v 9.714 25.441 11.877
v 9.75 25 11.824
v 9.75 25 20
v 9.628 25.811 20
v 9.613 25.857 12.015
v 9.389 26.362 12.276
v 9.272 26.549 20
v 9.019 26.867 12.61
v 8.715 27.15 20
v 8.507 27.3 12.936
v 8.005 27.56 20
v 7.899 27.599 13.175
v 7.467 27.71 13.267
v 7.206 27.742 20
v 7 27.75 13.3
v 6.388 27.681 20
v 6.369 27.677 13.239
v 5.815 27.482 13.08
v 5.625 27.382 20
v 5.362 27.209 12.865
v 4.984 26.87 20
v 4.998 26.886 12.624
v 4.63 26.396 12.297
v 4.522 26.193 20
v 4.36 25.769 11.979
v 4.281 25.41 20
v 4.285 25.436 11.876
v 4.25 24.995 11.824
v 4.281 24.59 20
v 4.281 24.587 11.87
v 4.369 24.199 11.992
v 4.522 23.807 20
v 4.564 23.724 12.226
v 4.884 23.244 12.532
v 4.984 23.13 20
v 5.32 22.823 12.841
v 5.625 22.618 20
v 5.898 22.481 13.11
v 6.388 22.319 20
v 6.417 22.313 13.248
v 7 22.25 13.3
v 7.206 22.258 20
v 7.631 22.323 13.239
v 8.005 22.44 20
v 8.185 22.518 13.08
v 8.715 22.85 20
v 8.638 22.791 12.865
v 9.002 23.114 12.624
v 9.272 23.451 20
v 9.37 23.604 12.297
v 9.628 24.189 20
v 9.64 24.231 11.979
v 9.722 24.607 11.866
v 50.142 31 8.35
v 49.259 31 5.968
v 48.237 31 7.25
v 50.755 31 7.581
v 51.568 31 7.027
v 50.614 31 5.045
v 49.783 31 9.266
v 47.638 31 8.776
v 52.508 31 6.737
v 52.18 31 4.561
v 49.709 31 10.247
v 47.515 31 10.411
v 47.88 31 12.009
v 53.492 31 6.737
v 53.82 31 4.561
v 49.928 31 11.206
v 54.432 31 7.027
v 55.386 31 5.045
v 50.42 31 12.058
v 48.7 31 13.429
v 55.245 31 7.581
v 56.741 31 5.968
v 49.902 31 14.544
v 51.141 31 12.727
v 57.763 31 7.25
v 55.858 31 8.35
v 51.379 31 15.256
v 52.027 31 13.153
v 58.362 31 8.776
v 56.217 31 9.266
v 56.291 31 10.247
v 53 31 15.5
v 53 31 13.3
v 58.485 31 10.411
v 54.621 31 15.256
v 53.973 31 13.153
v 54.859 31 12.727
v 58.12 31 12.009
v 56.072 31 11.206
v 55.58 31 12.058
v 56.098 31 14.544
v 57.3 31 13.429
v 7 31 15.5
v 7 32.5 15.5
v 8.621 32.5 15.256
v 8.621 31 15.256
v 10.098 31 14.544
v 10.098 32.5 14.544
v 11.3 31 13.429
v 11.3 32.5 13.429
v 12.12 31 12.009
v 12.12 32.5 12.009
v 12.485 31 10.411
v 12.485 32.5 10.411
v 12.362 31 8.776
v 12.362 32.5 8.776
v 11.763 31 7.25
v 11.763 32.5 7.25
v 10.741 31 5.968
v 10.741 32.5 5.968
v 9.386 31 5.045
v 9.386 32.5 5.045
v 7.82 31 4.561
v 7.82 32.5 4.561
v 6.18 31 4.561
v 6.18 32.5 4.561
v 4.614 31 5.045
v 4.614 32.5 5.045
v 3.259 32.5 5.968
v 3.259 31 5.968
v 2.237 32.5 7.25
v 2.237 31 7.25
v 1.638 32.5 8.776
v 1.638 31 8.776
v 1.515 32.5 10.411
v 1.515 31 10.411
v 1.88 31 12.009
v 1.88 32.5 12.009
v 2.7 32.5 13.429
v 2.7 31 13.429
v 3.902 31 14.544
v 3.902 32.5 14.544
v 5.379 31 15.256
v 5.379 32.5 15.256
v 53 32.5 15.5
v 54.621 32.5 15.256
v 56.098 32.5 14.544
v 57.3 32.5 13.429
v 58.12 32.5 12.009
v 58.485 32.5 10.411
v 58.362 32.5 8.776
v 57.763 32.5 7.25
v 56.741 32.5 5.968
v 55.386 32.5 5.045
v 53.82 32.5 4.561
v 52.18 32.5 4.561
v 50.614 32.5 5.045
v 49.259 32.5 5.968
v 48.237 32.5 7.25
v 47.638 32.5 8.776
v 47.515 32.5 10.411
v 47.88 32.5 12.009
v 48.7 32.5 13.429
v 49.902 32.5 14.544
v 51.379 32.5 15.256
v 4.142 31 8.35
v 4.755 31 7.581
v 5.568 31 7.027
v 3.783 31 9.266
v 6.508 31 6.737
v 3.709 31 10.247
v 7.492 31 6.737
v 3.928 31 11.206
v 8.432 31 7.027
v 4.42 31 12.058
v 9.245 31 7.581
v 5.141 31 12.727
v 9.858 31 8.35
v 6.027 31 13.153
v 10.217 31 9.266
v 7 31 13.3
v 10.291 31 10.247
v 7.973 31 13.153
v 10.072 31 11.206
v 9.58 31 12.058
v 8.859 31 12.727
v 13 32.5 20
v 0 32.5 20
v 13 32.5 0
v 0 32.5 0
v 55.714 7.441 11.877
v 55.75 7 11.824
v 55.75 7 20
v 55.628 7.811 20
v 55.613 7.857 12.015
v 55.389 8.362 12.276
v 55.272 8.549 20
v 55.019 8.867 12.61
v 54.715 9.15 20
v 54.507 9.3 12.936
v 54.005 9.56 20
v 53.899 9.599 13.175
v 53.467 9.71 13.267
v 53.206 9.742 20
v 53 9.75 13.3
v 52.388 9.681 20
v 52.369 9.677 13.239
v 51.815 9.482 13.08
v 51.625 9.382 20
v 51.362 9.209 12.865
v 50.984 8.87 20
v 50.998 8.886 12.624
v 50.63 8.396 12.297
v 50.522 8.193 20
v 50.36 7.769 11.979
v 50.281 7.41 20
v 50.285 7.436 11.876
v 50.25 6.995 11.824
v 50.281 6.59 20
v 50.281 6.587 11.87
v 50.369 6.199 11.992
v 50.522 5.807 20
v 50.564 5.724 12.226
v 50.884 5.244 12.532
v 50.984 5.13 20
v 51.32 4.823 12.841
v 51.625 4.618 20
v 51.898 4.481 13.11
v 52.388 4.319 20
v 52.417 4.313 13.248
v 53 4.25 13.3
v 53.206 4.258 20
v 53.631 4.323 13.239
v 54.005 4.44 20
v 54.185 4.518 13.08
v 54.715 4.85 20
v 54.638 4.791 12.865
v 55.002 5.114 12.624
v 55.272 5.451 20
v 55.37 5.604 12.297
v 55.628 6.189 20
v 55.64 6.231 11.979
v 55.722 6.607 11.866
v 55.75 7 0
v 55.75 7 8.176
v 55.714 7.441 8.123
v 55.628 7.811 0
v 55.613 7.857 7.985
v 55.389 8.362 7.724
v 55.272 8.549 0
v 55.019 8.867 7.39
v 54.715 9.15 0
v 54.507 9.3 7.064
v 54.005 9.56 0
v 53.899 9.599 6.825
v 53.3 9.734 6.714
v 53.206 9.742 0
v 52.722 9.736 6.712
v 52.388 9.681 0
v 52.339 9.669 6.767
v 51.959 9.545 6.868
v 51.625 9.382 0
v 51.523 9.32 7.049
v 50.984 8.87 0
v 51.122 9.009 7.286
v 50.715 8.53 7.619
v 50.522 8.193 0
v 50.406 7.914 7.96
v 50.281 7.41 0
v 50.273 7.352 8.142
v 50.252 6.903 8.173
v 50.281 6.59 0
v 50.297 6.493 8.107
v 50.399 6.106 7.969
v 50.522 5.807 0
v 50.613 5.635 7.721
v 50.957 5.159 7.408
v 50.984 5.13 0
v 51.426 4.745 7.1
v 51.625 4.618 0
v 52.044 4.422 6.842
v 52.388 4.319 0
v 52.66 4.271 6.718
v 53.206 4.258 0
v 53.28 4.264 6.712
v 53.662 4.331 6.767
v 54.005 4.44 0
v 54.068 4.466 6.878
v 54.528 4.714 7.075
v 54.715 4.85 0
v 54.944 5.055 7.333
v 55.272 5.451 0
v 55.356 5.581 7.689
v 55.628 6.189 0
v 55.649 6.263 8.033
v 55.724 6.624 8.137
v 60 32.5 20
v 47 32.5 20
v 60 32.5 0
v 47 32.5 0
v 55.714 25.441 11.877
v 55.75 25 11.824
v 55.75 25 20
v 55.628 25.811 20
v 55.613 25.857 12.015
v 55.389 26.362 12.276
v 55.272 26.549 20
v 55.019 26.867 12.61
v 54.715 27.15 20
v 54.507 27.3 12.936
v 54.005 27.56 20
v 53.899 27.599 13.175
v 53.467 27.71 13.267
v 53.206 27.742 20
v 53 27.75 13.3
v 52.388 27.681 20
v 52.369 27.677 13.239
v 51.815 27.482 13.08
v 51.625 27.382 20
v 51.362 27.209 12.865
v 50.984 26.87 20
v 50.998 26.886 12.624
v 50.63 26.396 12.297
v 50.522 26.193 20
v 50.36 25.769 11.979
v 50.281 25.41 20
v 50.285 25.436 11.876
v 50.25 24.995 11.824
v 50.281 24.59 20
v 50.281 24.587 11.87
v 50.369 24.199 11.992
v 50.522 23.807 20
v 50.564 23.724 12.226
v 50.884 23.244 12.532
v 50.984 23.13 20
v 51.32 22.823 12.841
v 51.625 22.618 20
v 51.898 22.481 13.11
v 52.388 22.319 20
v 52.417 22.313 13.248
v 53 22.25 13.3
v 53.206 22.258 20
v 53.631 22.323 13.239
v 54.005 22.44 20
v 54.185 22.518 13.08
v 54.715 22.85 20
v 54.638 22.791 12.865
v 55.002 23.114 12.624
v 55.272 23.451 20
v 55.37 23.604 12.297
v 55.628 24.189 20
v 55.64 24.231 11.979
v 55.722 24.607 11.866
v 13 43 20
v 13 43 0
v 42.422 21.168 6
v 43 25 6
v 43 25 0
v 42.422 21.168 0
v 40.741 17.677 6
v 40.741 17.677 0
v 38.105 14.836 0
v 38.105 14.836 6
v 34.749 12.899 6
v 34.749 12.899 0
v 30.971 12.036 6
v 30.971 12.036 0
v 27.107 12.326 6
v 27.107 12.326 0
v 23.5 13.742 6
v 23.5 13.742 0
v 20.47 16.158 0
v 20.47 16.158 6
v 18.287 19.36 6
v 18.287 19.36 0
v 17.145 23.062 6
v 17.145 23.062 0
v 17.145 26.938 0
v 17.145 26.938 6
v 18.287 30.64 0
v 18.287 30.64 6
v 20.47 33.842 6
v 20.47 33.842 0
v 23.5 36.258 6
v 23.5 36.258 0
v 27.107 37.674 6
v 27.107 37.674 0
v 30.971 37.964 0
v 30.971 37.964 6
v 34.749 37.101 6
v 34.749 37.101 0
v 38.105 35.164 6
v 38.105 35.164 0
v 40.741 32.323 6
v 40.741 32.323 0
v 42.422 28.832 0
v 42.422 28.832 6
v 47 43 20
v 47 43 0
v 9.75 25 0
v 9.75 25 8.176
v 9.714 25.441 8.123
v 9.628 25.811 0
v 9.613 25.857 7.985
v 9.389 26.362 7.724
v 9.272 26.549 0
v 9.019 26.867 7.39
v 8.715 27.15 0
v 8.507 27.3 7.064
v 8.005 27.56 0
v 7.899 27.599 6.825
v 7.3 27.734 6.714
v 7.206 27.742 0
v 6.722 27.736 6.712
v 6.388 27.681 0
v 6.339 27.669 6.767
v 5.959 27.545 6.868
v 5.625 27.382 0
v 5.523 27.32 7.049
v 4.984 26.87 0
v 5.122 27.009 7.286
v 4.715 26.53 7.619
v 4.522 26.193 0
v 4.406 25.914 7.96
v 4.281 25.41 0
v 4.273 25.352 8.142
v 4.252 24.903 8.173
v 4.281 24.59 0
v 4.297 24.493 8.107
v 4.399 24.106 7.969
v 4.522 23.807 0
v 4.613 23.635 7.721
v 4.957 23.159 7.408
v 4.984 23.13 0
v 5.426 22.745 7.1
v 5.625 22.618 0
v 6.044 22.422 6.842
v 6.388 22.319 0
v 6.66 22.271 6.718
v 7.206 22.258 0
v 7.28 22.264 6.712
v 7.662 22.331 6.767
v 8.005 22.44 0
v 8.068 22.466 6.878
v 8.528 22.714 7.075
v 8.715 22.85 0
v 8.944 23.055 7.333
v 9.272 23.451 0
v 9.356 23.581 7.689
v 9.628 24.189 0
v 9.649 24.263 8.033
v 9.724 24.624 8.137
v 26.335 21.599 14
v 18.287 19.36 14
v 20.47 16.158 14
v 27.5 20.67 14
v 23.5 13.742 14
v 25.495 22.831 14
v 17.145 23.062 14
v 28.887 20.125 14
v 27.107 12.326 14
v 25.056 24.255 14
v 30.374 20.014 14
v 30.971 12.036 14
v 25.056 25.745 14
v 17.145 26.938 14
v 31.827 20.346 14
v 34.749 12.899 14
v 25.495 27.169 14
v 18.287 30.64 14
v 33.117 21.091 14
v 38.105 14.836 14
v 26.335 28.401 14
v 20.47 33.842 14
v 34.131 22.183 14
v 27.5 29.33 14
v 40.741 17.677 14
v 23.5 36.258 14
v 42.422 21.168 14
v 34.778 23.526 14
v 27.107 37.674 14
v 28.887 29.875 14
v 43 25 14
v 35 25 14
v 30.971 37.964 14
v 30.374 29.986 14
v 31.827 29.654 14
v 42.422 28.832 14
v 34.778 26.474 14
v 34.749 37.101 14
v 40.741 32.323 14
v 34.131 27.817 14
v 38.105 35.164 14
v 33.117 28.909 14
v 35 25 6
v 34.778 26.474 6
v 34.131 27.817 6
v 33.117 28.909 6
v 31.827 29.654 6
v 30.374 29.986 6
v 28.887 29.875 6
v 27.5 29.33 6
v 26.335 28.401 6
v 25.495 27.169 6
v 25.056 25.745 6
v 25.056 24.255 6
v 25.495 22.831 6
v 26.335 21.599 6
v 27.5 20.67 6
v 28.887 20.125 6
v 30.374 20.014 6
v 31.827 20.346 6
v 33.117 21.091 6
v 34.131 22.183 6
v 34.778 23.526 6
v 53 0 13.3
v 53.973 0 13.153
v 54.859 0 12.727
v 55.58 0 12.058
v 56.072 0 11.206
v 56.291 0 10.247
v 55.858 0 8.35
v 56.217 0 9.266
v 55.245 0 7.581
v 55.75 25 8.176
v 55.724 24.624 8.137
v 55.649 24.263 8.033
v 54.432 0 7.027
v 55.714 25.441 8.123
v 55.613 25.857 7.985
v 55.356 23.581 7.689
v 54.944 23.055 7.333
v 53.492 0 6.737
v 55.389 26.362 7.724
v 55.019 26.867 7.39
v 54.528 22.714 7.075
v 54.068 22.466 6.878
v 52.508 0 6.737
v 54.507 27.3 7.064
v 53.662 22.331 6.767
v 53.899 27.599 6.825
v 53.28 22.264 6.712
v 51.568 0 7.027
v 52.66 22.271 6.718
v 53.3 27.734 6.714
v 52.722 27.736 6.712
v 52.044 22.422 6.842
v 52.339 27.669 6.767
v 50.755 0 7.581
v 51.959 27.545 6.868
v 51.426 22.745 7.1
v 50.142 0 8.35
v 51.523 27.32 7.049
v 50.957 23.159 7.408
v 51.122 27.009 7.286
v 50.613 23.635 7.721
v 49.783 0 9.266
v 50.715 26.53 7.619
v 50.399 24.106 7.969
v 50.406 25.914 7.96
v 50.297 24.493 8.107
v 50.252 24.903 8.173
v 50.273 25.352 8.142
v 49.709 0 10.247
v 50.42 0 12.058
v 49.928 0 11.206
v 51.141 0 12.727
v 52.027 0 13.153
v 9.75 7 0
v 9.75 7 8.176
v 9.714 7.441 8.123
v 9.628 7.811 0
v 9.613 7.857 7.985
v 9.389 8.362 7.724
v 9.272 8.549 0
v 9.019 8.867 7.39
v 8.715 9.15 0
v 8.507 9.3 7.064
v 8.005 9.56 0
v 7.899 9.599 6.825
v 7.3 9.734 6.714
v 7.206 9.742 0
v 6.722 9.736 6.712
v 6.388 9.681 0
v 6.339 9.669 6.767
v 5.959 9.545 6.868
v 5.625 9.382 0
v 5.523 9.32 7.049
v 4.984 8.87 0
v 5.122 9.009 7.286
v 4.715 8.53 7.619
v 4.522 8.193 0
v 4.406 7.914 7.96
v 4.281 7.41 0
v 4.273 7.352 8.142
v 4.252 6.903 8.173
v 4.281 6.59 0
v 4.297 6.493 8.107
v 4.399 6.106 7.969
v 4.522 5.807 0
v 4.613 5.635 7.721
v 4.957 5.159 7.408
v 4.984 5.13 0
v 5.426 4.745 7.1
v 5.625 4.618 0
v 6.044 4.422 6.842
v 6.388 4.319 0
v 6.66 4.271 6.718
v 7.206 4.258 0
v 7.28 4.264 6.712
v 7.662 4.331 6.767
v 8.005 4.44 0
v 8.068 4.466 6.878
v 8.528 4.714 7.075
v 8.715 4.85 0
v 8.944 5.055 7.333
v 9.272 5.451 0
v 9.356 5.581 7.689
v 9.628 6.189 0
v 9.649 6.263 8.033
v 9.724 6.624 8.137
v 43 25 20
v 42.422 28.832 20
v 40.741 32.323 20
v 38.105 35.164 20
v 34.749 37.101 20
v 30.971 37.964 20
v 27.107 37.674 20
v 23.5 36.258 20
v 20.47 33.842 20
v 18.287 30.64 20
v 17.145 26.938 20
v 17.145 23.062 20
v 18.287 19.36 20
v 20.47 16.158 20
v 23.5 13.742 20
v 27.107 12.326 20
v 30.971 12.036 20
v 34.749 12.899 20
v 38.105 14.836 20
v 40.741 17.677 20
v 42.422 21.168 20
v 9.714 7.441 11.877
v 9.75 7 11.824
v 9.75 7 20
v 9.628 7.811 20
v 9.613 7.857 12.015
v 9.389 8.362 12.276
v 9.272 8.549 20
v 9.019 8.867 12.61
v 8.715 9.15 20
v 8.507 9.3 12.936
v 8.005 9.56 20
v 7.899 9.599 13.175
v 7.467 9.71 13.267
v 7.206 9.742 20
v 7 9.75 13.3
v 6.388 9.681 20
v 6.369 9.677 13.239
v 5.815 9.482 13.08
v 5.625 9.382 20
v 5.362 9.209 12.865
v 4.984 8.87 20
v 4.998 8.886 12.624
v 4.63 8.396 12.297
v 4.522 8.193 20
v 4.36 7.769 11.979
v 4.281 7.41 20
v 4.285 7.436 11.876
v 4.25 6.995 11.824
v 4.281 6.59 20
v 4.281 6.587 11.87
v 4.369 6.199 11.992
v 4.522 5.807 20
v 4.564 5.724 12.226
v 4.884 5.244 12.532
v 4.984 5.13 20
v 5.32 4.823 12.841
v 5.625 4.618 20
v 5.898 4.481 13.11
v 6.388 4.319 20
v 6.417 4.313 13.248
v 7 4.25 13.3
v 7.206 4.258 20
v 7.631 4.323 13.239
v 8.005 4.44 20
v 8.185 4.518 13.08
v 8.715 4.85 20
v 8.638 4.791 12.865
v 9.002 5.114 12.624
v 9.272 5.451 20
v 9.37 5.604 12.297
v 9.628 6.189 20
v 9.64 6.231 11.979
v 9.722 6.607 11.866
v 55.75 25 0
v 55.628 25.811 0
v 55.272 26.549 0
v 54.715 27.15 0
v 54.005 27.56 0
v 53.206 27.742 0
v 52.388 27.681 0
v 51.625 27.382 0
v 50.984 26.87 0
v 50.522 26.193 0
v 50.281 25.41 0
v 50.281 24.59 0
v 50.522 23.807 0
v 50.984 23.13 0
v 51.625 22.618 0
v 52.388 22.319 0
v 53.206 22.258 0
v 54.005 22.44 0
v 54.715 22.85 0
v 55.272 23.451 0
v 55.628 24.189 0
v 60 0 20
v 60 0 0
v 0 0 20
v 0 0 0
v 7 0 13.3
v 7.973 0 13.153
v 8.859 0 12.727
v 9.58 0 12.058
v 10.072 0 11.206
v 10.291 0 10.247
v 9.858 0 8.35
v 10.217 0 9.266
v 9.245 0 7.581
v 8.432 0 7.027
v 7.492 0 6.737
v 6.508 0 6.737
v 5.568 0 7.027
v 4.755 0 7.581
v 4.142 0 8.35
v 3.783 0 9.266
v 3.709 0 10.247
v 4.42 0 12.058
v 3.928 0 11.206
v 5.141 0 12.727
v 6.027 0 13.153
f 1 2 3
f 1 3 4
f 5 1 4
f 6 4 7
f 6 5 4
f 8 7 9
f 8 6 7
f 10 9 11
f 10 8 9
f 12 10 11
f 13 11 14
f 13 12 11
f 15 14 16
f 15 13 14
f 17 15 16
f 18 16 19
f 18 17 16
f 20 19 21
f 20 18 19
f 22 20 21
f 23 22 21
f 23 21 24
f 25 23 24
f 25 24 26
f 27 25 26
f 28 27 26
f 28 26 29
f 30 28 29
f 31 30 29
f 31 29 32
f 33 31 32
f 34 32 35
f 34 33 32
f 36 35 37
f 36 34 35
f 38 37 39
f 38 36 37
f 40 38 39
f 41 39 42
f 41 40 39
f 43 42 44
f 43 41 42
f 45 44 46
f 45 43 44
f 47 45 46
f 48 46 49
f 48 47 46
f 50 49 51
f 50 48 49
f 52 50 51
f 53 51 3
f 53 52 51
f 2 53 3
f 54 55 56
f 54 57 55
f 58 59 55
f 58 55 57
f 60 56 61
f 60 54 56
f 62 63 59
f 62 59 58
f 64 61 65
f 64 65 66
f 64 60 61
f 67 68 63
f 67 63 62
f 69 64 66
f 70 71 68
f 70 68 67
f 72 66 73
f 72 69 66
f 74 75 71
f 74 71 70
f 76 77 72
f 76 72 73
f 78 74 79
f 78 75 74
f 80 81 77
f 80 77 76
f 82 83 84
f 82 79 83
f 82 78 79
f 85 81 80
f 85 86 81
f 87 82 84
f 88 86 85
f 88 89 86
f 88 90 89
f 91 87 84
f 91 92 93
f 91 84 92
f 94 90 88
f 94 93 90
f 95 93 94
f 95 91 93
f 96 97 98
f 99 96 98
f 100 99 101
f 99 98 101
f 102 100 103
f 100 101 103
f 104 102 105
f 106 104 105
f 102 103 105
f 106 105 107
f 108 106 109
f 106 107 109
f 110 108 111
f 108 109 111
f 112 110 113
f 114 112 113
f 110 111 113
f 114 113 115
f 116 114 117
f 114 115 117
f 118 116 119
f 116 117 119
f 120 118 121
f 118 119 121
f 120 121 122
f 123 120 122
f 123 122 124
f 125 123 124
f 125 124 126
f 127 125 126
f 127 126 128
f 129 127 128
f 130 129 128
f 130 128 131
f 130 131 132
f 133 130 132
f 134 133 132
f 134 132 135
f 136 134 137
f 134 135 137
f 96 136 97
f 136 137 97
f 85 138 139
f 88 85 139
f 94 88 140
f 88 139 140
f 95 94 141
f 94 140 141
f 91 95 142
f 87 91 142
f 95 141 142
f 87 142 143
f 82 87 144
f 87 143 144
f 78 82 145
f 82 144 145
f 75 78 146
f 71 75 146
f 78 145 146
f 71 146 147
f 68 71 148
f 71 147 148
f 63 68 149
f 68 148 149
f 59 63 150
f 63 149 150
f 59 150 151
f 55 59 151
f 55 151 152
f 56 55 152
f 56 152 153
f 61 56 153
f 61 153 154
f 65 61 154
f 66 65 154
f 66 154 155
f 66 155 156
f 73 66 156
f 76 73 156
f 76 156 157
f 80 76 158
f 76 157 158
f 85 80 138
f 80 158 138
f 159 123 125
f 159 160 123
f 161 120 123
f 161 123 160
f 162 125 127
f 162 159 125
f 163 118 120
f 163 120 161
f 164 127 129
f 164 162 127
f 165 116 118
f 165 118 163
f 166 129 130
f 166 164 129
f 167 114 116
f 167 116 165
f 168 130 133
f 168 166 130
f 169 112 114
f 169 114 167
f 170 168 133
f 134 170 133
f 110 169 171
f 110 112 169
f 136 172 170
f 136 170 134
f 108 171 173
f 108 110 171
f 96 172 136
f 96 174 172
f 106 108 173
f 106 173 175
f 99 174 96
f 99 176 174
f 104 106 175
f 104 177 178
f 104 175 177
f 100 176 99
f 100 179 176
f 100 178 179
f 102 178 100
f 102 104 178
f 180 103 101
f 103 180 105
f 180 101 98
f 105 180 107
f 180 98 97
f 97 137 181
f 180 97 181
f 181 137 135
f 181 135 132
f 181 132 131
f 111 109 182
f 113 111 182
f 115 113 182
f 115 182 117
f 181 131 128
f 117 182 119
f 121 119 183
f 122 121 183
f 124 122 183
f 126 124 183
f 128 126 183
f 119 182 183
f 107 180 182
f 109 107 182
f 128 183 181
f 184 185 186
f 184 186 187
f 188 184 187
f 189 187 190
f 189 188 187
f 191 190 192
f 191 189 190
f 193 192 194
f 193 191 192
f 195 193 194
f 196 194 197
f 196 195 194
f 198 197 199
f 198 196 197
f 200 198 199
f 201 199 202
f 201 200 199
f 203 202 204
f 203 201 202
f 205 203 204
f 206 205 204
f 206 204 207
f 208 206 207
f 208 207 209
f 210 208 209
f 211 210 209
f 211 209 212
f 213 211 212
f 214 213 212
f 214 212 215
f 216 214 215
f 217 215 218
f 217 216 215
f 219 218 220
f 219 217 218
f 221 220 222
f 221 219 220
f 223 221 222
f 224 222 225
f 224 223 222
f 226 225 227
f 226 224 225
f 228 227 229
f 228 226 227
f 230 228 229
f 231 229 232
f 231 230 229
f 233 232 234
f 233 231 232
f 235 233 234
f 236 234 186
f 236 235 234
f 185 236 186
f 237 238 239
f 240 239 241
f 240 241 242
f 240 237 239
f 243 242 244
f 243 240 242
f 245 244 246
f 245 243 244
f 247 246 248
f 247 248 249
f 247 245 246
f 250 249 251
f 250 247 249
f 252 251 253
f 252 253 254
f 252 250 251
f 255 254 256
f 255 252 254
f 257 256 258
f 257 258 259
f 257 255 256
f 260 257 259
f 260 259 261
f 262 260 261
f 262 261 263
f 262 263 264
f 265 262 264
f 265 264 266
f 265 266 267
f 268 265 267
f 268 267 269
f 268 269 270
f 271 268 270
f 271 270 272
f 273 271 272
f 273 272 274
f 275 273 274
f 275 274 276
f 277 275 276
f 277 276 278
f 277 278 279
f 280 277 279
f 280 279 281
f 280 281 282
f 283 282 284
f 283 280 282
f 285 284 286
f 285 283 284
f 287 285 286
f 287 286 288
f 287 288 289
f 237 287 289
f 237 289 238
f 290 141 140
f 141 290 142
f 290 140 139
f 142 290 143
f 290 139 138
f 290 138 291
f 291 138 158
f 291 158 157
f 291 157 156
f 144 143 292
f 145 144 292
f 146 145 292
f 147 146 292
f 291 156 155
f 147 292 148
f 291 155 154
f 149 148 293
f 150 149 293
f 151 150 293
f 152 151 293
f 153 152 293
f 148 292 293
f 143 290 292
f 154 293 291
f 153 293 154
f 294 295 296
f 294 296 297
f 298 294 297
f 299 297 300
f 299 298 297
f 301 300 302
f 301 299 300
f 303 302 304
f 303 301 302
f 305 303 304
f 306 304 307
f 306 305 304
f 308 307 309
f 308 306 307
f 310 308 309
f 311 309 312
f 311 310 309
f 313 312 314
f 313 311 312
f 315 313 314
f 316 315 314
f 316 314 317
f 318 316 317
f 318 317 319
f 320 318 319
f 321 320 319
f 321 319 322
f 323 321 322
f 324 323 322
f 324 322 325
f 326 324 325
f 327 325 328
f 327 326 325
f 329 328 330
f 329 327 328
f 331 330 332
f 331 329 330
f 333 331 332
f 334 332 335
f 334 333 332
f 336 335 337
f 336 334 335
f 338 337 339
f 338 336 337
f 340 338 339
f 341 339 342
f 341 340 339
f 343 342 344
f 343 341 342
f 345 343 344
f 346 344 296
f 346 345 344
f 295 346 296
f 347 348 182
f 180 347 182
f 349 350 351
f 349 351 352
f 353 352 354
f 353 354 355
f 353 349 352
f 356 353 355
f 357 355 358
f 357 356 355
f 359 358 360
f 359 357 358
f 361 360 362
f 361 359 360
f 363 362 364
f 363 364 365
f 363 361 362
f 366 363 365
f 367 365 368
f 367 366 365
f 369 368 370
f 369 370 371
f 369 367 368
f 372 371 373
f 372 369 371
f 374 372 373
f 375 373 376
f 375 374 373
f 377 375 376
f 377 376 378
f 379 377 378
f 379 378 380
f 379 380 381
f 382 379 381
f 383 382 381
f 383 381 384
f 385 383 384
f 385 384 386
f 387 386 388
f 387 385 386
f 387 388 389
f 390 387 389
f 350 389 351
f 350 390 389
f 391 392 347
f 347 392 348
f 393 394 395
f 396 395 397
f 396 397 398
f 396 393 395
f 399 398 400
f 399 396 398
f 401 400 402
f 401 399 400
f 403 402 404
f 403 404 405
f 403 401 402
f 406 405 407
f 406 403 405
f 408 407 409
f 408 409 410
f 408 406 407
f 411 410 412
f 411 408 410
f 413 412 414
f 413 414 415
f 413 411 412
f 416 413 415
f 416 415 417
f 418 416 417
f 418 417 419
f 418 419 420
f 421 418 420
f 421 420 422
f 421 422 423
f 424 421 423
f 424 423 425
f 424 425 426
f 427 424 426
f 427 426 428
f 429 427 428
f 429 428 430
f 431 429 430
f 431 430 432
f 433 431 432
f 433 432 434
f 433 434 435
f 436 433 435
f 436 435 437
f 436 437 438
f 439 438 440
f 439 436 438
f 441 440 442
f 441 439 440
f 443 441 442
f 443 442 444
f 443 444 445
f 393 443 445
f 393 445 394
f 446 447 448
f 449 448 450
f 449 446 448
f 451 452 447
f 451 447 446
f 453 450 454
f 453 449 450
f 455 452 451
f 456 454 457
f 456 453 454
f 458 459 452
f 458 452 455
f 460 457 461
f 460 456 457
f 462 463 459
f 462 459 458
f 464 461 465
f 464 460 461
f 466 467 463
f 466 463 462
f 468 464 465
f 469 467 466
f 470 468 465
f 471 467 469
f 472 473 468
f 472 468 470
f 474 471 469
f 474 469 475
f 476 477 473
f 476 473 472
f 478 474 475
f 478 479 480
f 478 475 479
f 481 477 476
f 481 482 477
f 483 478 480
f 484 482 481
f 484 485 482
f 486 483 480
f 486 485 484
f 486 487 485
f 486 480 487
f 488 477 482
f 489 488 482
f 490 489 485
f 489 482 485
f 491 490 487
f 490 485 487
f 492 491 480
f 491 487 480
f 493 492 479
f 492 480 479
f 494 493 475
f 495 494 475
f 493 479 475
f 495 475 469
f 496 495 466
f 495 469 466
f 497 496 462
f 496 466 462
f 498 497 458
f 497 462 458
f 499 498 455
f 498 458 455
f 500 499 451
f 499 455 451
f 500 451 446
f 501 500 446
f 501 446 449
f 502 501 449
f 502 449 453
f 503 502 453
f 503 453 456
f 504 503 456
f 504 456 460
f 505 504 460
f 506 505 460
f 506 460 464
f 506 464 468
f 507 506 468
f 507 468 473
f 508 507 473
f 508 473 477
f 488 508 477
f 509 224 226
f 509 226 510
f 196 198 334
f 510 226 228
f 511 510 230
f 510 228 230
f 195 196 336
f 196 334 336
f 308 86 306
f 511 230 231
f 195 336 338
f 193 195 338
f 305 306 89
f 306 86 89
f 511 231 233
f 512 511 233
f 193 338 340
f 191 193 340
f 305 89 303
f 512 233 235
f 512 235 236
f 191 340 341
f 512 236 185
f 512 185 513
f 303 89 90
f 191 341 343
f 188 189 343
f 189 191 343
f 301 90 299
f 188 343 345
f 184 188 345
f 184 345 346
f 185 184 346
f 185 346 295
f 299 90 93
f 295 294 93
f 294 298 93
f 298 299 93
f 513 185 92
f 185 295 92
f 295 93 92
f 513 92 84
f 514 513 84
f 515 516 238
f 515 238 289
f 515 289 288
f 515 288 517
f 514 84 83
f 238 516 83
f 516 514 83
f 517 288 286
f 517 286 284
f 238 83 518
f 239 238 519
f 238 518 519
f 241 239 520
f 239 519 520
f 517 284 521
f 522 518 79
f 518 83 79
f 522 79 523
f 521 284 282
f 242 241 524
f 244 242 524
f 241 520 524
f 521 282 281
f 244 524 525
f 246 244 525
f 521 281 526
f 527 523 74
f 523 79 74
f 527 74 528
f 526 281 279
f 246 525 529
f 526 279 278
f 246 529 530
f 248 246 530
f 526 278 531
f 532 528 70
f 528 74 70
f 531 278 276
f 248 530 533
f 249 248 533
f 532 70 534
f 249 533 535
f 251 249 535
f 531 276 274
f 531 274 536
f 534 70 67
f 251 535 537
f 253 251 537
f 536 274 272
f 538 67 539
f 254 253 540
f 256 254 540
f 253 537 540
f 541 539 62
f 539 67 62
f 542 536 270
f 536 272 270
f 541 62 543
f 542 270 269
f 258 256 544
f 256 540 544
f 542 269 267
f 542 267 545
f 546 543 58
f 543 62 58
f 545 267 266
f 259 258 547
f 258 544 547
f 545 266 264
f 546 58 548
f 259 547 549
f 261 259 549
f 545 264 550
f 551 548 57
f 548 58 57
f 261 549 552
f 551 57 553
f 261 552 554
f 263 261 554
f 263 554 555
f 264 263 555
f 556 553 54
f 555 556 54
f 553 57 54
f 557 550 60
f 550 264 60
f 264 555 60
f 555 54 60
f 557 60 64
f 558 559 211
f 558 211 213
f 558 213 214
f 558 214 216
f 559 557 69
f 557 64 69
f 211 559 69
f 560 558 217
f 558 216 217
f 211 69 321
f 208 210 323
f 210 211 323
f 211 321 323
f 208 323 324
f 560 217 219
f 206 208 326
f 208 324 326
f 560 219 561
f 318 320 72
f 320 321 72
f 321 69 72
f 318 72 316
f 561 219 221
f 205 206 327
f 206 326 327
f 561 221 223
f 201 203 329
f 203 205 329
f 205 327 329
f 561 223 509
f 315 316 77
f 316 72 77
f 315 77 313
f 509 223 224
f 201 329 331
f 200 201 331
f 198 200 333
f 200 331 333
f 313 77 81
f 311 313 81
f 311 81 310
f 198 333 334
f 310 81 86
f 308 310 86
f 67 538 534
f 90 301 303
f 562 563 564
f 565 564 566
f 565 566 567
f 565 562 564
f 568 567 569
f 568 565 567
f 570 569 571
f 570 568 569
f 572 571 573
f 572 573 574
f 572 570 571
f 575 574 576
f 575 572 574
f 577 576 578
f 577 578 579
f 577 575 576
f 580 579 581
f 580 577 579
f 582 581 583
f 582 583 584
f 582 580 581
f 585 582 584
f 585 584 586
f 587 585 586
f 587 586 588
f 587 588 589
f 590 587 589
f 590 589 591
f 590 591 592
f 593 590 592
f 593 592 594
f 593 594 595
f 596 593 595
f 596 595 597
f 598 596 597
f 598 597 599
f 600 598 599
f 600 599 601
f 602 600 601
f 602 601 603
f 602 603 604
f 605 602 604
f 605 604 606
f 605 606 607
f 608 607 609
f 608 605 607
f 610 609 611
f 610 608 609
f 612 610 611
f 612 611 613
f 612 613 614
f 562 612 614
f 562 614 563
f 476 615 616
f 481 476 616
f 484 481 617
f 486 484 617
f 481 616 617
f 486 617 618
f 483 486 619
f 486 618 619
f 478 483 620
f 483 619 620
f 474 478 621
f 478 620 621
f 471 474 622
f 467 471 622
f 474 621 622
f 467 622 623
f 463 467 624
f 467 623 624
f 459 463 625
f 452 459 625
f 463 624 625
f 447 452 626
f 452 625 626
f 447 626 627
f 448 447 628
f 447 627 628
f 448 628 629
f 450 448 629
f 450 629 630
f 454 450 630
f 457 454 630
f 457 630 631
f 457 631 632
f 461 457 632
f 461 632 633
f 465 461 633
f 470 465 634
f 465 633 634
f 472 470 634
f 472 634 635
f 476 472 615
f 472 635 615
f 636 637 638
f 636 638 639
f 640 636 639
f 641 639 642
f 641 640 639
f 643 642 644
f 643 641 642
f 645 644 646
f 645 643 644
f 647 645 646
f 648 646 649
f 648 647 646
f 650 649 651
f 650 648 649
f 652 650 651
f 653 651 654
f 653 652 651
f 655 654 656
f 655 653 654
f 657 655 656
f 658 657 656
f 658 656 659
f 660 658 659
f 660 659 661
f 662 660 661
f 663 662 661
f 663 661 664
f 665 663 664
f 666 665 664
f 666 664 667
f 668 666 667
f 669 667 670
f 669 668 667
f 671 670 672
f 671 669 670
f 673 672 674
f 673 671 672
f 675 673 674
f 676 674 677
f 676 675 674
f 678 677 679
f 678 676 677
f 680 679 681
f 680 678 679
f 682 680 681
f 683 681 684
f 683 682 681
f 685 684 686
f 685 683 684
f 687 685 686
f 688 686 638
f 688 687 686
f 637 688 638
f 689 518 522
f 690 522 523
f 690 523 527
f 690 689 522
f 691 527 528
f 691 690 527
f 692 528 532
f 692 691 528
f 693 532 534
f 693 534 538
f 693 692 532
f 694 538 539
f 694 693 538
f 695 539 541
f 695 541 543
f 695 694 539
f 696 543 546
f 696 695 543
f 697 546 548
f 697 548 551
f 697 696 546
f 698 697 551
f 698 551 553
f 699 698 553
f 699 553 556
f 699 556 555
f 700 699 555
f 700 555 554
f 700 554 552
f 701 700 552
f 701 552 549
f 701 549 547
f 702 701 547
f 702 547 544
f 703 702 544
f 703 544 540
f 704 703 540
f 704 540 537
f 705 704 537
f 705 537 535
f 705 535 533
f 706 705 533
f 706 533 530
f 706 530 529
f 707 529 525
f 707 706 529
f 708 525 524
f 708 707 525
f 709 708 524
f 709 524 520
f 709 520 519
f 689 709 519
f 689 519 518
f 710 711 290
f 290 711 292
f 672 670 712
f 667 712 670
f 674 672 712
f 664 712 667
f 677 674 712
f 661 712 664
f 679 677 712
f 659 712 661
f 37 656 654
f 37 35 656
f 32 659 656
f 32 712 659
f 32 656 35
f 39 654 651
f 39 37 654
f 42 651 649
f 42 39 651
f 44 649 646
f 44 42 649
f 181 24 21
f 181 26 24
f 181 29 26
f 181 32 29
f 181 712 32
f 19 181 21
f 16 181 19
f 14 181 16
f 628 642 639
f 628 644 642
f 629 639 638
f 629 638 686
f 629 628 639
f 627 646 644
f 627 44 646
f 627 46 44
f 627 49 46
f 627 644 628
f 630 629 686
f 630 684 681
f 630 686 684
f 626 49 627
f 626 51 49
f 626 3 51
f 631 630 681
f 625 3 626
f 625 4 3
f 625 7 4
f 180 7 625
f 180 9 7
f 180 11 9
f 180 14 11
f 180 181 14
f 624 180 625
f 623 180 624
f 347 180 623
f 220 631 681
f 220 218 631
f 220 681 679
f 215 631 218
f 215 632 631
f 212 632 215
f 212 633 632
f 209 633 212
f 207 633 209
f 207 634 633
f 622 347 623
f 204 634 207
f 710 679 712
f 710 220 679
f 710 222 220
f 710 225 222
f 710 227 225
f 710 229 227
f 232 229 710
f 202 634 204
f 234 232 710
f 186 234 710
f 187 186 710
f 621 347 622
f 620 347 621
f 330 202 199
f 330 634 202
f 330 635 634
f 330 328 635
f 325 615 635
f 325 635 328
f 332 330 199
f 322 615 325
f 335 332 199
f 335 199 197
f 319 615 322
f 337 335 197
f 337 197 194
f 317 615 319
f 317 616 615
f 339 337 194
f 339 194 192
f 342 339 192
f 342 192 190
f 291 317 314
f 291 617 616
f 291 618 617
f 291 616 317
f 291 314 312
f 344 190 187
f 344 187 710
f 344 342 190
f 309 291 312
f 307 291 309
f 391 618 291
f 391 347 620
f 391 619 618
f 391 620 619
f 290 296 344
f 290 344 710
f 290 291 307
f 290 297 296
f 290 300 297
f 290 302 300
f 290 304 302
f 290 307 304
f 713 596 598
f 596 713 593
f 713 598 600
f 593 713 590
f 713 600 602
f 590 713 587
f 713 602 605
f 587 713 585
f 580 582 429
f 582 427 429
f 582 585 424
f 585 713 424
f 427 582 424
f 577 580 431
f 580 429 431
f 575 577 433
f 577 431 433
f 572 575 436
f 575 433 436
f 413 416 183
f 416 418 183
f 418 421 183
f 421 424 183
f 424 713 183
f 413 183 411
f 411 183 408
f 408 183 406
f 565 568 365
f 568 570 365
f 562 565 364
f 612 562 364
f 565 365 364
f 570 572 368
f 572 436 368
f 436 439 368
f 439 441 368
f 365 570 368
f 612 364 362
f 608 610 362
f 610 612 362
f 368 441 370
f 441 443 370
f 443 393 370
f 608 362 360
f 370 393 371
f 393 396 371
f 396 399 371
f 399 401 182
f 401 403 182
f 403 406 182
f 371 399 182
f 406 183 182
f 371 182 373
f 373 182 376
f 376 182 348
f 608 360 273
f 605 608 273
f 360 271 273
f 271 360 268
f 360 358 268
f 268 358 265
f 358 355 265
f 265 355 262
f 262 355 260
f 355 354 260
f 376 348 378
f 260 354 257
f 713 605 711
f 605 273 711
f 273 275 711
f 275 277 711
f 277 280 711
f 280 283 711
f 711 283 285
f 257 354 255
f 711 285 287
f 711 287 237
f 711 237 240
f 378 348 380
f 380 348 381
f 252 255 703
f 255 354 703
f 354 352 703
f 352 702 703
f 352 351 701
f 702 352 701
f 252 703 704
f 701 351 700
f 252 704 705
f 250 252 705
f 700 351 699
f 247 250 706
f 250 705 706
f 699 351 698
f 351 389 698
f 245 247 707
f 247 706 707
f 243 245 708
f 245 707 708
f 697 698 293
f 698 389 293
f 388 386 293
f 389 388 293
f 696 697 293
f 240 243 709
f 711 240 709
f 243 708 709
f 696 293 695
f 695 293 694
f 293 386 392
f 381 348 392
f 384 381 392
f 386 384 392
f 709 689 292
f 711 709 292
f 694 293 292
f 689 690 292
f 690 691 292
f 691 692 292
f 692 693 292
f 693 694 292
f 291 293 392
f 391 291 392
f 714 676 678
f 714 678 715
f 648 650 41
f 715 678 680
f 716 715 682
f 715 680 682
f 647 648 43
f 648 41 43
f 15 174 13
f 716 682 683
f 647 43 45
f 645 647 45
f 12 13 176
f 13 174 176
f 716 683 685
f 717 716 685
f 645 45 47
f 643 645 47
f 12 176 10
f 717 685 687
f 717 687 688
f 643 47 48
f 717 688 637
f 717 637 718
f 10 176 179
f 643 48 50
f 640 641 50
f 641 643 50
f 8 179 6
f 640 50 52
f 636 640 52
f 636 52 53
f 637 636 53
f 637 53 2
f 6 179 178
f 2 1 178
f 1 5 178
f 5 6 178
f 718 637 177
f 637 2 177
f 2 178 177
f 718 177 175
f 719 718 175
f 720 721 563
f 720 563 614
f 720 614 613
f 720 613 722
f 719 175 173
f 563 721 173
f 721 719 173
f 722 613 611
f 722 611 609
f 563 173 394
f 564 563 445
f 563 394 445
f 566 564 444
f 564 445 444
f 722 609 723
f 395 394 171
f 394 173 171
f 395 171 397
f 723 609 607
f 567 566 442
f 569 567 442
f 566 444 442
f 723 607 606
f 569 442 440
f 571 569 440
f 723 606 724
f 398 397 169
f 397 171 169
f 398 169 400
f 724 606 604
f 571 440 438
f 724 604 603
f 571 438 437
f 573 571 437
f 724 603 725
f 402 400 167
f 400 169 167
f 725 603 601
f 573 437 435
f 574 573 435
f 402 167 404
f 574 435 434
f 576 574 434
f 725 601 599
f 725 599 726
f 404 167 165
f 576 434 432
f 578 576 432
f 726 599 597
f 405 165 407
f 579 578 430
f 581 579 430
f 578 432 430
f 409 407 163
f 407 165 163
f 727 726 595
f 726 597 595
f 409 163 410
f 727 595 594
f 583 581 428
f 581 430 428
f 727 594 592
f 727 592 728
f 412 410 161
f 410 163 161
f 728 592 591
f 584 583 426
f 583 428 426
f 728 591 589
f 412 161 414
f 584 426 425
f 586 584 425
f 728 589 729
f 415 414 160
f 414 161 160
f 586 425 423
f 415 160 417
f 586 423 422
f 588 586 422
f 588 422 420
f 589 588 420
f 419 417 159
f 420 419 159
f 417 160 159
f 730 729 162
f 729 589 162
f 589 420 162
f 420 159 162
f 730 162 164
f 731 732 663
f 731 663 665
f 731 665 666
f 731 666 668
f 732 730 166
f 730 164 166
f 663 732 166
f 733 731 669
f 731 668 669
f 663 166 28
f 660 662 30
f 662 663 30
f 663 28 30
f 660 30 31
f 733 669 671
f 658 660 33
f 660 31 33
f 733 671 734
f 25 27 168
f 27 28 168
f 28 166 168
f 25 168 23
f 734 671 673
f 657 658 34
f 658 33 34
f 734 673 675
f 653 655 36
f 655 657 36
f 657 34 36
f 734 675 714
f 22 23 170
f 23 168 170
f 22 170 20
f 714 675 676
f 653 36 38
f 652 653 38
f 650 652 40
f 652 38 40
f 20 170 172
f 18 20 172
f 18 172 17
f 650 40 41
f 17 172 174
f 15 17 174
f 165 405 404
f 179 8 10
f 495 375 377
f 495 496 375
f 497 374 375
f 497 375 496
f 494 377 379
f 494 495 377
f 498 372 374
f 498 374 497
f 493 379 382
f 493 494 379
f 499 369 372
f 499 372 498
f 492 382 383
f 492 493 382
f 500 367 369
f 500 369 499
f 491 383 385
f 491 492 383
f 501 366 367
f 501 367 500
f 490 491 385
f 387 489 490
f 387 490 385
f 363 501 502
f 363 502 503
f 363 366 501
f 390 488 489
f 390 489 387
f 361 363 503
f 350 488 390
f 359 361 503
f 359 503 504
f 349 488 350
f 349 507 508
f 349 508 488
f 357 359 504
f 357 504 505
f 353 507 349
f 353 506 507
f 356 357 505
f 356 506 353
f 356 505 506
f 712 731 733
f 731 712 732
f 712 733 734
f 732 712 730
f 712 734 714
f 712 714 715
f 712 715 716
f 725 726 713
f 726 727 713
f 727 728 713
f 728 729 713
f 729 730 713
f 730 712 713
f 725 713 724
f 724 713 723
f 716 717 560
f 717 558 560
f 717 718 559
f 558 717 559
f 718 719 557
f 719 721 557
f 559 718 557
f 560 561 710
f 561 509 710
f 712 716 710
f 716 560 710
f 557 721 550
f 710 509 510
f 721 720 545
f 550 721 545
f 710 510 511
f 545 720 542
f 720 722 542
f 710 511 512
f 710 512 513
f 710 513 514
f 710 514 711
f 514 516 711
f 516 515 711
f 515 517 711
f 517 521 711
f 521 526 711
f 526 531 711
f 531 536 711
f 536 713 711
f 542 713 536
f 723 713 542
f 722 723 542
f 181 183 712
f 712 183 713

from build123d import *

# Parameters (mm, degrees)
CROQUIS1_R              = 2.75
SALIENTE_EXTRUIR1_DEPTH = 20
CROQUIS2_R              = 5
CORTAR_EXTRUIR1_DEPTH   = 20
CROQUIS3_R              = 13
CORTAR_EXTRUIR2_DEPTH   = 6
CORTAR_EXTRUIR3_START   = -6
CROQUIS4_R              = 13
CORTAR_EXTRUIR3_DEPTH   = 6
CROQUIS5_R              = 3.3
CORTAR_EXTRUIR4_DEPTH   = 72.107313267
CROQUIS6_R              = 5.5
CORTAR_EXTRUIR5_DEPTH   = 1.5


with BuildPart() as part:
    # Croquis1 → Saliente-Extruir1 (new body)
    with BuildSketch(Plane.XY):
        Polygon((0, 0), (60, 0), (60, 32.5), (47, 32.5), (47, 43), (13, 43), (13, 32.5), (0, 32.5), align=None)
        with Locations((7, 25)):
            Circle(CROQUIS1_R, mode=Mode.SUBTRACT)
        with Locations((53, 25)):
            Circle(CROQUIS1_R, mode=Mode.SUBTRACT)
        with Locations((53, 7)):
            Circle(CROQUIS1_R, mode=Mode.SUBTRACT)
        with Locations((7, 7)):
            Circle(CROQUIS1_R, mode=Mode.SUBTRACT)
    extrude(amount=SALIENTE_EXTRUIR1_DEPTH)

    # Croquis2 → Cortar-Extruir1 (cut)
    with BuildSketch(Plane.XY.offset(20)):
        with Locations((30, 25)):
            Circle(CROQUIS2_R)
    extrude(amount=-CORTAR_EXTRUIR1_DEPTH, mode=Mode.SUBTRACT)

    # Croquis3 → Cortar-Extruir2 (cut)
    with BuildSketch(Plane.XY.offset(20)):
        with Locations((30, 25)):
            Circle(CROQUIS3_R)
    extrude(amount=-CORTAR_EXTRUIR2_DEPTH, mode=Mode.SUBTRACT)

    # Croquis4 → Cortar-Extruir3 (cut)
    with BuildSketch(Plane(origin=(0, 0, 0), x_dir=(-1, 0, 0), z_dir=(0, 0, -1)).offset(CORTAR_EXTRUIR3_START)):
        with Locations(Location((-30, 25, 0), (0, 0, 180))):
            Circle(CROQUIS4_R)
    extrude(amount=CORTAR_EXTRUIR3_DEPTH, mode=Mode.SUBTRACT)

    # Croquis5 → Cortar-Extruir4 (cut, through all)
    with BuildSketch(Plane(origin=(0, 32.5, 0), x_dir=(1, 0, 0), z_dir=(0, 1, 0))):
        with Locations(Location((7, -10, 0), (0, 0, 270))):
            Circle(CROQUIS5_R)
        with Locations(Location((53, -10, 0), (0, 0, 270))):
            Circle(CROQUIS5_R)
    extrude(amount=-CORTAR_EXTRUIR4_DEPTH, mode=Mode.SUBTRACT)

    # Croquis6 → Cortar-Extruir5 (cut)
    with BuildSketch(Plane(origin=(0, 32.5, 0), x_dir=(1, 0, 0), z_dir=(0, 1, 0))):
        with Locations(Location((7, -10, 0), (0, 0, 270))):
            Circle(CROQUIS6_R)
        with Locations(Location((53, -10, 0), (0, 0, 270))):
            Circle(CROQUIS6_R)
    extrude(amount=-CORTAR_EXTRUIR5_DEPTH, mode=Mode.SUBTRACT)


solid = part.part
